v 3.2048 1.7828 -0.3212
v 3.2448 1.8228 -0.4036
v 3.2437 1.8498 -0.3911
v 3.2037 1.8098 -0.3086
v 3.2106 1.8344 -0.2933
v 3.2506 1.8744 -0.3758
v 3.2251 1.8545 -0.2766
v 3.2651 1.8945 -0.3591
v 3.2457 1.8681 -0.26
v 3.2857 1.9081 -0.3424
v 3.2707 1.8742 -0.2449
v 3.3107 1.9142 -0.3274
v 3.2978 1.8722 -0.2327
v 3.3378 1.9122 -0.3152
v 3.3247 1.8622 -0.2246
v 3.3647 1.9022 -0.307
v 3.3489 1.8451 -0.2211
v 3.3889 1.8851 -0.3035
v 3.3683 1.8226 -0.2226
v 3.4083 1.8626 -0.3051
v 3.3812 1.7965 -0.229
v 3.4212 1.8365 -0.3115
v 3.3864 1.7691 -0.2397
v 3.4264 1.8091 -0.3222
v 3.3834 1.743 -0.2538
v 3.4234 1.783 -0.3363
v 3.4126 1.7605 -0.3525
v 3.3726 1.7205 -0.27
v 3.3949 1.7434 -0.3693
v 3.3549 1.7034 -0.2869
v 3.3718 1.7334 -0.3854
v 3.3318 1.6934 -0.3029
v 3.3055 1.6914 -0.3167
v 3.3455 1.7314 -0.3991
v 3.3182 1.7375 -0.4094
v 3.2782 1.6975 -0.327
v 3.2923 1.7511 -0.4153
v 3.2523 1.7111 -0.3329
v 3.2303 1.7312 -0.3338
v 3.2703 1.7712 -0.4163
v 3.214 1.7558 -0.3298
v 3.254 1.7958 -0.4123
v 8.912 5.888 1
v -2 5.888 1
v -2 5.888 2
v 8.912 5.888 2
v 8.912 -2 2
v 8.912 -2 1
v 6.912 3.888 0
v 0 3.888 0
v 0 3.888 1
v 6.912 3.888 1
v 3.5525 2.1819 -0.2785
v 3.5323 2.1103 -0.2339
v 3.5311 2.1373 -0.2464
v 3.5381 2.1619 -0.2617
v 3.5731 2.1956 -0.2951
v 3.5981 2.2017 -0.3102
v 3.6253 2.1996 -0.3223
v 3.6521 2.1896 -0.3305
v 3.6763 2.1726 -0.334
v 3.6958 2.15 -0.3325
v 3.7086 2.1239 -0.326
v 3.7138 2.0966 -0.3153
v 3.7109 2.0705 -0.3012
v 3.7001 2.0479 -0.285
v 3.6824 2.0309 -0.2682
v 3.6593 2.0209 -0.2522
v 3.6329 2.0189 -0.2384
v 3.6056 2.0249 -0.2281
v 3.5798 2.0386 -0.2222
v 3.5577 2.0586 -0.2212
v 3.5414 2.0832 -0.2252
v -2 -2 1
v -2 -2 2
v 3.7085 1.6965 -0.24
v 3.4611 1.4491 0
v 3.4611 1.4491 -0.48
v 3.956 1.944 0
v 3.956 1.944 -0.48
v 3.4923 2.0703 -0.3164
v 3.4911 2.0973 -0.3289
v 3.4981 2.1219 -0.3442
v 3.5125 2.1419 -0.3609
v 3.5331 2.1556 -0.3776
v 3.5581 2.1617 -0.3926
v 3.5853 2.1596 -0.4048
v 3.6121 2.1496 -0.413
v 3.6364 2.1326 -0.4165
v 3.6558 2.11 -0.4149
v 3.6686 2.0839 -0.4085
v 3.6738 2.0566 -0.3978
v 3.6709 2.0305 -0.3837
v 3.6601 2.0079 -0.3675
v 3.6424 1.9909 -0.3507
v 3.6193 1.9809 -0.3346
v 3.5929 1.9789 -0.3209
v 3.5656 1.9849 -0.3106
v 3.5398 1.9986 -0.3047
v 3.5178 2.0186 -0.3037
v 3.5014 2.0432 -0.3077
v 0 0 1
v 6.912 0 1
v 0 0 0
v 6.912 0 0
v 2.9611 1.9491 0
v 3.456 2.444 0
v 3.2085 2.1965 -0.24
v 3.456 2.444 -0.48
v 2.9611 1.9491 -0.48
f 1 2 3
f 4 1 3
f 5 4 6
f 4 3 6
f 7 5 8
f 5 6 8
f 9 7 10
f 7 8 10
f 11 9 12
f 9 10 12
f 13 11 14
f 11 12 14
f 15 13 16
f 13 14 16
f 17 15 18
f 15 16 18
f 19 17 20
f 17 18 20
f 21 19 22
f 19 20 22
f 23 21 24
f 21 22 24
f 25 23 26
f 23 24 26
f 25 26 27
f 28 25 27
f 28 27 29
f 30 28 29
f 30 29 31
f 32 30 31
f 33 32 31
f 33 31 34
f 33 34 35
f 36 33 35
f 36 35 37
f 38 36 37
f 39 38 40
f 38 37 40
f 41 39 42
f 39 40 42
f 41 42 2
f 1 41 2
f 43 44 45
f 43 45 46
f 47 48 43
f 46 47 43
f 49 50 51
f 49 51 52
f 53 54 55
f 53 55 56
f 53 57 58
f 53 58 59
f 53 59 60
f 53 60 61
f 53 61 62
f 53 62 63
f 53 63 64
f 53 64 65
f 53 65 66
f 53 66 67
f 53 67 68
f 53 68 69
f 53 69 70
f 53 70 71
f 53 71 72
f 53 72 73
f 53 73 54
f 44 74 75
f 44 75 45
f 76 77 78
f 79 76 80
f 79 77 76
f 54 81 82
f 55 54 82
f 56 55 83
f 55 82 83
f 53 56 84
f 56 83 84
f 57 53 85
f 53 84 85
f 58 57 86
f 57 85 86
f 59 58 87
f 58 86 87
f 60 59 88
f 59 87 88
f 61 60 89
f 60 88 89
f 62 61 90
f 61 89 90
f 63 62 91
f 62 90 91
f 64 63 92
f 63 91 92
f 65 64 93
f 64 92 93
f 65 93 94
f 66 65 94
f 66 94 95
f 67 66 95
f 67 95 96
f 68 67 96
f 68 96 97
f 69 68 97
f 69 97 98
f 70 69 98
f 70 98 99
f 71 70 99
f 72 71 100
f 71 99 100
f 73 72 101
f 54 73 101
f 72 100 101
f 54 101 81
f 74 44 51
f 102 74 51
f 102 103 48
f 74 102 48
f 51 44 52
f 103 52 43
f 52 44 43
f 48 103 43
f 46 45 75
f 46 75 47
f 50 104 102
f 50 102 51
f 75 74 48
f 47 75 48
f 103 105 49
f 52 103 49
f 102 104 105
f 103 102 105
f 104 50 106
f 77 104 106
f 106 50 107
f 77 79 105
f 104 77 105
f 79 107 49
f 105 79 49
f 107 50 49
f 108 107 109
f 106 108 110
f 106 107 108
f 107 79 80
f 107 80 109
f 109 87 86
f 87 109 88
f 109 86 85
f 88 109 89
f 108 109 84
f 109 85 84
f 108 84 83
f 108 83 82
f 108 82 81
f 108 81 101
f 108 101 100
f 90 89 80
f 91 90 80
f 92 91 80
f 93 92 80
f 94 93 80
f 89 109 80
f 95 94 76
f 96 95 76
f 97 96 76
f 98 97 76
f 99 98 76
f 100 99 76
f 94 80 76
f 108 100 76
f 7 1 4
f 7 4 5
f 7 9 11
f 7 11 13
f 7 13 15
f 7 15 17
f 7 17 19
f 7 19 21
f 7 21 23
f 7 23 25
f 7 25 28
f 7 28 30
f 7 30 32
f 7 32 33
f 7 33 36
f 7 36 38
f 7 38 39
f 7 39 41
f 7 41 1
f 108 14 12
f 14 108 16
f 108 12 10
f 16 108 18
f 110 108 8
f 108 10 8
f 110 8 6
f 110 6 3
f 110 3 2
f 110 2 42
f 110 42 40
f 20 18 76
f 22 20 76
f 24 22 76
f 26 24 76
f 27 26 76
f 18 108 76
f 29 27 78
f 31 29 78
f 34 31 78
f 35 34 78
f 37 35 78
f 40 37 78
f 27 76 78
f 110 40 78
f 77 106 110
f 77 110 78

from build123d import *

# Parameters (mm, degrees)
SKIZZE1_W                       = 6.912
SKIZZE1_H                       = 3.888
AUFSATZ_LINEAR_AUSTRAGEN1_DEPTH = 1
SKIZZE2_W                       = 10.912
SKIZZE2_H                       = 7.888
AUFSATZ_LINEAR_AUSTRAGEN2_DEPTH = 1
AUFSATZ_LINEAR_AUSTRAGEN3_DEPTH = 0.48
SCHNITT_LINEAR_AUSTRAGEN1_DEPTH = 40.48
SKIZZE7_R                       = 0.1
SCHNITT_LINEAR_AUSTRAGEN2_DEPTH = 0.1
SKIZZE8_R                       = 0.1
SCHNITT_LINEAR_AUSTRAGEN3_DEPTH = 0.1


with BuildPart() as part:
    # Skizze1 → Aufsatz-Linear austragen1 (new body)
    with BuildSketch(Plane.XY):
        with Locations((3.456, 1.944)):
            Rectangle(SKIZZE1_W, SKIZZE1_H)
    extrude(amount=AUFSATZ_LINEAR_AUSTRAGEN1_DEPTH)

    # Skizze2 → Aufsatz-Linear austragen2 (add)
    with BuildSketch(Plane.XY.offset(1)):
        with Locations((3.456, 1.944)):
            Rectangle(SKIZZE2_W, SKIZZE2_H)
    extrude(amount=AUFSATZ_LINEAR_AUSTRAGEN2_DEPTH)

    # Skizze3 → Aufsatz-Linear austragen3 (add)
    with BuildSketch(Plane(origin=(0, 0, 0), x_dir=(-1, 0, 0), z_dir=(0, 0, -1))):
        Polygon((-3.956, 1.944), (-3.456, 2.444), (-2.961061255, 1.949061255), (-3.461061255, 1.449061255), align=None)
    extrude(amount=AUFSATZ_LINEAR_AUSTRAGEN3_DEPTH)

    # Skizze6 → Schnitt-Linear austragen1 (cut)
    with BuildSketch(Plane(origin=(1.006, -1.006, 0), x_dir=(0, 0, -1), z_dir=(0.7071067811865474, -0.7071067811865477, 0))):
        Polygon((0.48, 4.171930009), (0.24, 3.821955466), (0.48, 3.471980924), align=None)
    extrude(amount=-SCHNITT_LINEAR_AUSTRAGEN1_DEPTH, mode=Mode.SUBTRACT)

    # Skizze7 → Schnitt-Linear austragen2 (cut)
    with BuildSketch(Plane(origin=(0.943569205, 0.943569205, -1.945870659), x_dir=(-0.916554971633356, 0.17448706179529924, -0.35983503059071614), z_dir=(0.3999087195525726, 0.3999087195525724, -0.8247096653075213))):
        with Locations(Location((-2.60892888, 1.483064665, 0), (0, 0, 349.02546357))):
            Circle(SKIZZE7_R)
    extrude(amount=-SCHNITT_LINEAR_AUSTRAGEN2_DEPTH, mode=Mode.SUBTRACT)

    # Skizze8 → Schnitt-Linear austragen3 (cut)
    with BuildSketch(Plane(origin=(0.785261084, 0.785261084, 1.619400564), x_dir=(-0.916554971633356, 0.17448706179529927, 0.3598350305907162), z_dir=(-0.3999087195525727, -0.3999087195525724, -0.8247096653075213))):
        with Locations(Location((-3.051649182, 2.019884252, 0), (0, 0, 349.02546357))):
            Circle(SKIZZE8_R)
    extrude(amount=-SCHNITT_LINEAR_AUSTRAGEN3_DEPTH, mode=Mode.SUBTRACT)


solid = part.part
